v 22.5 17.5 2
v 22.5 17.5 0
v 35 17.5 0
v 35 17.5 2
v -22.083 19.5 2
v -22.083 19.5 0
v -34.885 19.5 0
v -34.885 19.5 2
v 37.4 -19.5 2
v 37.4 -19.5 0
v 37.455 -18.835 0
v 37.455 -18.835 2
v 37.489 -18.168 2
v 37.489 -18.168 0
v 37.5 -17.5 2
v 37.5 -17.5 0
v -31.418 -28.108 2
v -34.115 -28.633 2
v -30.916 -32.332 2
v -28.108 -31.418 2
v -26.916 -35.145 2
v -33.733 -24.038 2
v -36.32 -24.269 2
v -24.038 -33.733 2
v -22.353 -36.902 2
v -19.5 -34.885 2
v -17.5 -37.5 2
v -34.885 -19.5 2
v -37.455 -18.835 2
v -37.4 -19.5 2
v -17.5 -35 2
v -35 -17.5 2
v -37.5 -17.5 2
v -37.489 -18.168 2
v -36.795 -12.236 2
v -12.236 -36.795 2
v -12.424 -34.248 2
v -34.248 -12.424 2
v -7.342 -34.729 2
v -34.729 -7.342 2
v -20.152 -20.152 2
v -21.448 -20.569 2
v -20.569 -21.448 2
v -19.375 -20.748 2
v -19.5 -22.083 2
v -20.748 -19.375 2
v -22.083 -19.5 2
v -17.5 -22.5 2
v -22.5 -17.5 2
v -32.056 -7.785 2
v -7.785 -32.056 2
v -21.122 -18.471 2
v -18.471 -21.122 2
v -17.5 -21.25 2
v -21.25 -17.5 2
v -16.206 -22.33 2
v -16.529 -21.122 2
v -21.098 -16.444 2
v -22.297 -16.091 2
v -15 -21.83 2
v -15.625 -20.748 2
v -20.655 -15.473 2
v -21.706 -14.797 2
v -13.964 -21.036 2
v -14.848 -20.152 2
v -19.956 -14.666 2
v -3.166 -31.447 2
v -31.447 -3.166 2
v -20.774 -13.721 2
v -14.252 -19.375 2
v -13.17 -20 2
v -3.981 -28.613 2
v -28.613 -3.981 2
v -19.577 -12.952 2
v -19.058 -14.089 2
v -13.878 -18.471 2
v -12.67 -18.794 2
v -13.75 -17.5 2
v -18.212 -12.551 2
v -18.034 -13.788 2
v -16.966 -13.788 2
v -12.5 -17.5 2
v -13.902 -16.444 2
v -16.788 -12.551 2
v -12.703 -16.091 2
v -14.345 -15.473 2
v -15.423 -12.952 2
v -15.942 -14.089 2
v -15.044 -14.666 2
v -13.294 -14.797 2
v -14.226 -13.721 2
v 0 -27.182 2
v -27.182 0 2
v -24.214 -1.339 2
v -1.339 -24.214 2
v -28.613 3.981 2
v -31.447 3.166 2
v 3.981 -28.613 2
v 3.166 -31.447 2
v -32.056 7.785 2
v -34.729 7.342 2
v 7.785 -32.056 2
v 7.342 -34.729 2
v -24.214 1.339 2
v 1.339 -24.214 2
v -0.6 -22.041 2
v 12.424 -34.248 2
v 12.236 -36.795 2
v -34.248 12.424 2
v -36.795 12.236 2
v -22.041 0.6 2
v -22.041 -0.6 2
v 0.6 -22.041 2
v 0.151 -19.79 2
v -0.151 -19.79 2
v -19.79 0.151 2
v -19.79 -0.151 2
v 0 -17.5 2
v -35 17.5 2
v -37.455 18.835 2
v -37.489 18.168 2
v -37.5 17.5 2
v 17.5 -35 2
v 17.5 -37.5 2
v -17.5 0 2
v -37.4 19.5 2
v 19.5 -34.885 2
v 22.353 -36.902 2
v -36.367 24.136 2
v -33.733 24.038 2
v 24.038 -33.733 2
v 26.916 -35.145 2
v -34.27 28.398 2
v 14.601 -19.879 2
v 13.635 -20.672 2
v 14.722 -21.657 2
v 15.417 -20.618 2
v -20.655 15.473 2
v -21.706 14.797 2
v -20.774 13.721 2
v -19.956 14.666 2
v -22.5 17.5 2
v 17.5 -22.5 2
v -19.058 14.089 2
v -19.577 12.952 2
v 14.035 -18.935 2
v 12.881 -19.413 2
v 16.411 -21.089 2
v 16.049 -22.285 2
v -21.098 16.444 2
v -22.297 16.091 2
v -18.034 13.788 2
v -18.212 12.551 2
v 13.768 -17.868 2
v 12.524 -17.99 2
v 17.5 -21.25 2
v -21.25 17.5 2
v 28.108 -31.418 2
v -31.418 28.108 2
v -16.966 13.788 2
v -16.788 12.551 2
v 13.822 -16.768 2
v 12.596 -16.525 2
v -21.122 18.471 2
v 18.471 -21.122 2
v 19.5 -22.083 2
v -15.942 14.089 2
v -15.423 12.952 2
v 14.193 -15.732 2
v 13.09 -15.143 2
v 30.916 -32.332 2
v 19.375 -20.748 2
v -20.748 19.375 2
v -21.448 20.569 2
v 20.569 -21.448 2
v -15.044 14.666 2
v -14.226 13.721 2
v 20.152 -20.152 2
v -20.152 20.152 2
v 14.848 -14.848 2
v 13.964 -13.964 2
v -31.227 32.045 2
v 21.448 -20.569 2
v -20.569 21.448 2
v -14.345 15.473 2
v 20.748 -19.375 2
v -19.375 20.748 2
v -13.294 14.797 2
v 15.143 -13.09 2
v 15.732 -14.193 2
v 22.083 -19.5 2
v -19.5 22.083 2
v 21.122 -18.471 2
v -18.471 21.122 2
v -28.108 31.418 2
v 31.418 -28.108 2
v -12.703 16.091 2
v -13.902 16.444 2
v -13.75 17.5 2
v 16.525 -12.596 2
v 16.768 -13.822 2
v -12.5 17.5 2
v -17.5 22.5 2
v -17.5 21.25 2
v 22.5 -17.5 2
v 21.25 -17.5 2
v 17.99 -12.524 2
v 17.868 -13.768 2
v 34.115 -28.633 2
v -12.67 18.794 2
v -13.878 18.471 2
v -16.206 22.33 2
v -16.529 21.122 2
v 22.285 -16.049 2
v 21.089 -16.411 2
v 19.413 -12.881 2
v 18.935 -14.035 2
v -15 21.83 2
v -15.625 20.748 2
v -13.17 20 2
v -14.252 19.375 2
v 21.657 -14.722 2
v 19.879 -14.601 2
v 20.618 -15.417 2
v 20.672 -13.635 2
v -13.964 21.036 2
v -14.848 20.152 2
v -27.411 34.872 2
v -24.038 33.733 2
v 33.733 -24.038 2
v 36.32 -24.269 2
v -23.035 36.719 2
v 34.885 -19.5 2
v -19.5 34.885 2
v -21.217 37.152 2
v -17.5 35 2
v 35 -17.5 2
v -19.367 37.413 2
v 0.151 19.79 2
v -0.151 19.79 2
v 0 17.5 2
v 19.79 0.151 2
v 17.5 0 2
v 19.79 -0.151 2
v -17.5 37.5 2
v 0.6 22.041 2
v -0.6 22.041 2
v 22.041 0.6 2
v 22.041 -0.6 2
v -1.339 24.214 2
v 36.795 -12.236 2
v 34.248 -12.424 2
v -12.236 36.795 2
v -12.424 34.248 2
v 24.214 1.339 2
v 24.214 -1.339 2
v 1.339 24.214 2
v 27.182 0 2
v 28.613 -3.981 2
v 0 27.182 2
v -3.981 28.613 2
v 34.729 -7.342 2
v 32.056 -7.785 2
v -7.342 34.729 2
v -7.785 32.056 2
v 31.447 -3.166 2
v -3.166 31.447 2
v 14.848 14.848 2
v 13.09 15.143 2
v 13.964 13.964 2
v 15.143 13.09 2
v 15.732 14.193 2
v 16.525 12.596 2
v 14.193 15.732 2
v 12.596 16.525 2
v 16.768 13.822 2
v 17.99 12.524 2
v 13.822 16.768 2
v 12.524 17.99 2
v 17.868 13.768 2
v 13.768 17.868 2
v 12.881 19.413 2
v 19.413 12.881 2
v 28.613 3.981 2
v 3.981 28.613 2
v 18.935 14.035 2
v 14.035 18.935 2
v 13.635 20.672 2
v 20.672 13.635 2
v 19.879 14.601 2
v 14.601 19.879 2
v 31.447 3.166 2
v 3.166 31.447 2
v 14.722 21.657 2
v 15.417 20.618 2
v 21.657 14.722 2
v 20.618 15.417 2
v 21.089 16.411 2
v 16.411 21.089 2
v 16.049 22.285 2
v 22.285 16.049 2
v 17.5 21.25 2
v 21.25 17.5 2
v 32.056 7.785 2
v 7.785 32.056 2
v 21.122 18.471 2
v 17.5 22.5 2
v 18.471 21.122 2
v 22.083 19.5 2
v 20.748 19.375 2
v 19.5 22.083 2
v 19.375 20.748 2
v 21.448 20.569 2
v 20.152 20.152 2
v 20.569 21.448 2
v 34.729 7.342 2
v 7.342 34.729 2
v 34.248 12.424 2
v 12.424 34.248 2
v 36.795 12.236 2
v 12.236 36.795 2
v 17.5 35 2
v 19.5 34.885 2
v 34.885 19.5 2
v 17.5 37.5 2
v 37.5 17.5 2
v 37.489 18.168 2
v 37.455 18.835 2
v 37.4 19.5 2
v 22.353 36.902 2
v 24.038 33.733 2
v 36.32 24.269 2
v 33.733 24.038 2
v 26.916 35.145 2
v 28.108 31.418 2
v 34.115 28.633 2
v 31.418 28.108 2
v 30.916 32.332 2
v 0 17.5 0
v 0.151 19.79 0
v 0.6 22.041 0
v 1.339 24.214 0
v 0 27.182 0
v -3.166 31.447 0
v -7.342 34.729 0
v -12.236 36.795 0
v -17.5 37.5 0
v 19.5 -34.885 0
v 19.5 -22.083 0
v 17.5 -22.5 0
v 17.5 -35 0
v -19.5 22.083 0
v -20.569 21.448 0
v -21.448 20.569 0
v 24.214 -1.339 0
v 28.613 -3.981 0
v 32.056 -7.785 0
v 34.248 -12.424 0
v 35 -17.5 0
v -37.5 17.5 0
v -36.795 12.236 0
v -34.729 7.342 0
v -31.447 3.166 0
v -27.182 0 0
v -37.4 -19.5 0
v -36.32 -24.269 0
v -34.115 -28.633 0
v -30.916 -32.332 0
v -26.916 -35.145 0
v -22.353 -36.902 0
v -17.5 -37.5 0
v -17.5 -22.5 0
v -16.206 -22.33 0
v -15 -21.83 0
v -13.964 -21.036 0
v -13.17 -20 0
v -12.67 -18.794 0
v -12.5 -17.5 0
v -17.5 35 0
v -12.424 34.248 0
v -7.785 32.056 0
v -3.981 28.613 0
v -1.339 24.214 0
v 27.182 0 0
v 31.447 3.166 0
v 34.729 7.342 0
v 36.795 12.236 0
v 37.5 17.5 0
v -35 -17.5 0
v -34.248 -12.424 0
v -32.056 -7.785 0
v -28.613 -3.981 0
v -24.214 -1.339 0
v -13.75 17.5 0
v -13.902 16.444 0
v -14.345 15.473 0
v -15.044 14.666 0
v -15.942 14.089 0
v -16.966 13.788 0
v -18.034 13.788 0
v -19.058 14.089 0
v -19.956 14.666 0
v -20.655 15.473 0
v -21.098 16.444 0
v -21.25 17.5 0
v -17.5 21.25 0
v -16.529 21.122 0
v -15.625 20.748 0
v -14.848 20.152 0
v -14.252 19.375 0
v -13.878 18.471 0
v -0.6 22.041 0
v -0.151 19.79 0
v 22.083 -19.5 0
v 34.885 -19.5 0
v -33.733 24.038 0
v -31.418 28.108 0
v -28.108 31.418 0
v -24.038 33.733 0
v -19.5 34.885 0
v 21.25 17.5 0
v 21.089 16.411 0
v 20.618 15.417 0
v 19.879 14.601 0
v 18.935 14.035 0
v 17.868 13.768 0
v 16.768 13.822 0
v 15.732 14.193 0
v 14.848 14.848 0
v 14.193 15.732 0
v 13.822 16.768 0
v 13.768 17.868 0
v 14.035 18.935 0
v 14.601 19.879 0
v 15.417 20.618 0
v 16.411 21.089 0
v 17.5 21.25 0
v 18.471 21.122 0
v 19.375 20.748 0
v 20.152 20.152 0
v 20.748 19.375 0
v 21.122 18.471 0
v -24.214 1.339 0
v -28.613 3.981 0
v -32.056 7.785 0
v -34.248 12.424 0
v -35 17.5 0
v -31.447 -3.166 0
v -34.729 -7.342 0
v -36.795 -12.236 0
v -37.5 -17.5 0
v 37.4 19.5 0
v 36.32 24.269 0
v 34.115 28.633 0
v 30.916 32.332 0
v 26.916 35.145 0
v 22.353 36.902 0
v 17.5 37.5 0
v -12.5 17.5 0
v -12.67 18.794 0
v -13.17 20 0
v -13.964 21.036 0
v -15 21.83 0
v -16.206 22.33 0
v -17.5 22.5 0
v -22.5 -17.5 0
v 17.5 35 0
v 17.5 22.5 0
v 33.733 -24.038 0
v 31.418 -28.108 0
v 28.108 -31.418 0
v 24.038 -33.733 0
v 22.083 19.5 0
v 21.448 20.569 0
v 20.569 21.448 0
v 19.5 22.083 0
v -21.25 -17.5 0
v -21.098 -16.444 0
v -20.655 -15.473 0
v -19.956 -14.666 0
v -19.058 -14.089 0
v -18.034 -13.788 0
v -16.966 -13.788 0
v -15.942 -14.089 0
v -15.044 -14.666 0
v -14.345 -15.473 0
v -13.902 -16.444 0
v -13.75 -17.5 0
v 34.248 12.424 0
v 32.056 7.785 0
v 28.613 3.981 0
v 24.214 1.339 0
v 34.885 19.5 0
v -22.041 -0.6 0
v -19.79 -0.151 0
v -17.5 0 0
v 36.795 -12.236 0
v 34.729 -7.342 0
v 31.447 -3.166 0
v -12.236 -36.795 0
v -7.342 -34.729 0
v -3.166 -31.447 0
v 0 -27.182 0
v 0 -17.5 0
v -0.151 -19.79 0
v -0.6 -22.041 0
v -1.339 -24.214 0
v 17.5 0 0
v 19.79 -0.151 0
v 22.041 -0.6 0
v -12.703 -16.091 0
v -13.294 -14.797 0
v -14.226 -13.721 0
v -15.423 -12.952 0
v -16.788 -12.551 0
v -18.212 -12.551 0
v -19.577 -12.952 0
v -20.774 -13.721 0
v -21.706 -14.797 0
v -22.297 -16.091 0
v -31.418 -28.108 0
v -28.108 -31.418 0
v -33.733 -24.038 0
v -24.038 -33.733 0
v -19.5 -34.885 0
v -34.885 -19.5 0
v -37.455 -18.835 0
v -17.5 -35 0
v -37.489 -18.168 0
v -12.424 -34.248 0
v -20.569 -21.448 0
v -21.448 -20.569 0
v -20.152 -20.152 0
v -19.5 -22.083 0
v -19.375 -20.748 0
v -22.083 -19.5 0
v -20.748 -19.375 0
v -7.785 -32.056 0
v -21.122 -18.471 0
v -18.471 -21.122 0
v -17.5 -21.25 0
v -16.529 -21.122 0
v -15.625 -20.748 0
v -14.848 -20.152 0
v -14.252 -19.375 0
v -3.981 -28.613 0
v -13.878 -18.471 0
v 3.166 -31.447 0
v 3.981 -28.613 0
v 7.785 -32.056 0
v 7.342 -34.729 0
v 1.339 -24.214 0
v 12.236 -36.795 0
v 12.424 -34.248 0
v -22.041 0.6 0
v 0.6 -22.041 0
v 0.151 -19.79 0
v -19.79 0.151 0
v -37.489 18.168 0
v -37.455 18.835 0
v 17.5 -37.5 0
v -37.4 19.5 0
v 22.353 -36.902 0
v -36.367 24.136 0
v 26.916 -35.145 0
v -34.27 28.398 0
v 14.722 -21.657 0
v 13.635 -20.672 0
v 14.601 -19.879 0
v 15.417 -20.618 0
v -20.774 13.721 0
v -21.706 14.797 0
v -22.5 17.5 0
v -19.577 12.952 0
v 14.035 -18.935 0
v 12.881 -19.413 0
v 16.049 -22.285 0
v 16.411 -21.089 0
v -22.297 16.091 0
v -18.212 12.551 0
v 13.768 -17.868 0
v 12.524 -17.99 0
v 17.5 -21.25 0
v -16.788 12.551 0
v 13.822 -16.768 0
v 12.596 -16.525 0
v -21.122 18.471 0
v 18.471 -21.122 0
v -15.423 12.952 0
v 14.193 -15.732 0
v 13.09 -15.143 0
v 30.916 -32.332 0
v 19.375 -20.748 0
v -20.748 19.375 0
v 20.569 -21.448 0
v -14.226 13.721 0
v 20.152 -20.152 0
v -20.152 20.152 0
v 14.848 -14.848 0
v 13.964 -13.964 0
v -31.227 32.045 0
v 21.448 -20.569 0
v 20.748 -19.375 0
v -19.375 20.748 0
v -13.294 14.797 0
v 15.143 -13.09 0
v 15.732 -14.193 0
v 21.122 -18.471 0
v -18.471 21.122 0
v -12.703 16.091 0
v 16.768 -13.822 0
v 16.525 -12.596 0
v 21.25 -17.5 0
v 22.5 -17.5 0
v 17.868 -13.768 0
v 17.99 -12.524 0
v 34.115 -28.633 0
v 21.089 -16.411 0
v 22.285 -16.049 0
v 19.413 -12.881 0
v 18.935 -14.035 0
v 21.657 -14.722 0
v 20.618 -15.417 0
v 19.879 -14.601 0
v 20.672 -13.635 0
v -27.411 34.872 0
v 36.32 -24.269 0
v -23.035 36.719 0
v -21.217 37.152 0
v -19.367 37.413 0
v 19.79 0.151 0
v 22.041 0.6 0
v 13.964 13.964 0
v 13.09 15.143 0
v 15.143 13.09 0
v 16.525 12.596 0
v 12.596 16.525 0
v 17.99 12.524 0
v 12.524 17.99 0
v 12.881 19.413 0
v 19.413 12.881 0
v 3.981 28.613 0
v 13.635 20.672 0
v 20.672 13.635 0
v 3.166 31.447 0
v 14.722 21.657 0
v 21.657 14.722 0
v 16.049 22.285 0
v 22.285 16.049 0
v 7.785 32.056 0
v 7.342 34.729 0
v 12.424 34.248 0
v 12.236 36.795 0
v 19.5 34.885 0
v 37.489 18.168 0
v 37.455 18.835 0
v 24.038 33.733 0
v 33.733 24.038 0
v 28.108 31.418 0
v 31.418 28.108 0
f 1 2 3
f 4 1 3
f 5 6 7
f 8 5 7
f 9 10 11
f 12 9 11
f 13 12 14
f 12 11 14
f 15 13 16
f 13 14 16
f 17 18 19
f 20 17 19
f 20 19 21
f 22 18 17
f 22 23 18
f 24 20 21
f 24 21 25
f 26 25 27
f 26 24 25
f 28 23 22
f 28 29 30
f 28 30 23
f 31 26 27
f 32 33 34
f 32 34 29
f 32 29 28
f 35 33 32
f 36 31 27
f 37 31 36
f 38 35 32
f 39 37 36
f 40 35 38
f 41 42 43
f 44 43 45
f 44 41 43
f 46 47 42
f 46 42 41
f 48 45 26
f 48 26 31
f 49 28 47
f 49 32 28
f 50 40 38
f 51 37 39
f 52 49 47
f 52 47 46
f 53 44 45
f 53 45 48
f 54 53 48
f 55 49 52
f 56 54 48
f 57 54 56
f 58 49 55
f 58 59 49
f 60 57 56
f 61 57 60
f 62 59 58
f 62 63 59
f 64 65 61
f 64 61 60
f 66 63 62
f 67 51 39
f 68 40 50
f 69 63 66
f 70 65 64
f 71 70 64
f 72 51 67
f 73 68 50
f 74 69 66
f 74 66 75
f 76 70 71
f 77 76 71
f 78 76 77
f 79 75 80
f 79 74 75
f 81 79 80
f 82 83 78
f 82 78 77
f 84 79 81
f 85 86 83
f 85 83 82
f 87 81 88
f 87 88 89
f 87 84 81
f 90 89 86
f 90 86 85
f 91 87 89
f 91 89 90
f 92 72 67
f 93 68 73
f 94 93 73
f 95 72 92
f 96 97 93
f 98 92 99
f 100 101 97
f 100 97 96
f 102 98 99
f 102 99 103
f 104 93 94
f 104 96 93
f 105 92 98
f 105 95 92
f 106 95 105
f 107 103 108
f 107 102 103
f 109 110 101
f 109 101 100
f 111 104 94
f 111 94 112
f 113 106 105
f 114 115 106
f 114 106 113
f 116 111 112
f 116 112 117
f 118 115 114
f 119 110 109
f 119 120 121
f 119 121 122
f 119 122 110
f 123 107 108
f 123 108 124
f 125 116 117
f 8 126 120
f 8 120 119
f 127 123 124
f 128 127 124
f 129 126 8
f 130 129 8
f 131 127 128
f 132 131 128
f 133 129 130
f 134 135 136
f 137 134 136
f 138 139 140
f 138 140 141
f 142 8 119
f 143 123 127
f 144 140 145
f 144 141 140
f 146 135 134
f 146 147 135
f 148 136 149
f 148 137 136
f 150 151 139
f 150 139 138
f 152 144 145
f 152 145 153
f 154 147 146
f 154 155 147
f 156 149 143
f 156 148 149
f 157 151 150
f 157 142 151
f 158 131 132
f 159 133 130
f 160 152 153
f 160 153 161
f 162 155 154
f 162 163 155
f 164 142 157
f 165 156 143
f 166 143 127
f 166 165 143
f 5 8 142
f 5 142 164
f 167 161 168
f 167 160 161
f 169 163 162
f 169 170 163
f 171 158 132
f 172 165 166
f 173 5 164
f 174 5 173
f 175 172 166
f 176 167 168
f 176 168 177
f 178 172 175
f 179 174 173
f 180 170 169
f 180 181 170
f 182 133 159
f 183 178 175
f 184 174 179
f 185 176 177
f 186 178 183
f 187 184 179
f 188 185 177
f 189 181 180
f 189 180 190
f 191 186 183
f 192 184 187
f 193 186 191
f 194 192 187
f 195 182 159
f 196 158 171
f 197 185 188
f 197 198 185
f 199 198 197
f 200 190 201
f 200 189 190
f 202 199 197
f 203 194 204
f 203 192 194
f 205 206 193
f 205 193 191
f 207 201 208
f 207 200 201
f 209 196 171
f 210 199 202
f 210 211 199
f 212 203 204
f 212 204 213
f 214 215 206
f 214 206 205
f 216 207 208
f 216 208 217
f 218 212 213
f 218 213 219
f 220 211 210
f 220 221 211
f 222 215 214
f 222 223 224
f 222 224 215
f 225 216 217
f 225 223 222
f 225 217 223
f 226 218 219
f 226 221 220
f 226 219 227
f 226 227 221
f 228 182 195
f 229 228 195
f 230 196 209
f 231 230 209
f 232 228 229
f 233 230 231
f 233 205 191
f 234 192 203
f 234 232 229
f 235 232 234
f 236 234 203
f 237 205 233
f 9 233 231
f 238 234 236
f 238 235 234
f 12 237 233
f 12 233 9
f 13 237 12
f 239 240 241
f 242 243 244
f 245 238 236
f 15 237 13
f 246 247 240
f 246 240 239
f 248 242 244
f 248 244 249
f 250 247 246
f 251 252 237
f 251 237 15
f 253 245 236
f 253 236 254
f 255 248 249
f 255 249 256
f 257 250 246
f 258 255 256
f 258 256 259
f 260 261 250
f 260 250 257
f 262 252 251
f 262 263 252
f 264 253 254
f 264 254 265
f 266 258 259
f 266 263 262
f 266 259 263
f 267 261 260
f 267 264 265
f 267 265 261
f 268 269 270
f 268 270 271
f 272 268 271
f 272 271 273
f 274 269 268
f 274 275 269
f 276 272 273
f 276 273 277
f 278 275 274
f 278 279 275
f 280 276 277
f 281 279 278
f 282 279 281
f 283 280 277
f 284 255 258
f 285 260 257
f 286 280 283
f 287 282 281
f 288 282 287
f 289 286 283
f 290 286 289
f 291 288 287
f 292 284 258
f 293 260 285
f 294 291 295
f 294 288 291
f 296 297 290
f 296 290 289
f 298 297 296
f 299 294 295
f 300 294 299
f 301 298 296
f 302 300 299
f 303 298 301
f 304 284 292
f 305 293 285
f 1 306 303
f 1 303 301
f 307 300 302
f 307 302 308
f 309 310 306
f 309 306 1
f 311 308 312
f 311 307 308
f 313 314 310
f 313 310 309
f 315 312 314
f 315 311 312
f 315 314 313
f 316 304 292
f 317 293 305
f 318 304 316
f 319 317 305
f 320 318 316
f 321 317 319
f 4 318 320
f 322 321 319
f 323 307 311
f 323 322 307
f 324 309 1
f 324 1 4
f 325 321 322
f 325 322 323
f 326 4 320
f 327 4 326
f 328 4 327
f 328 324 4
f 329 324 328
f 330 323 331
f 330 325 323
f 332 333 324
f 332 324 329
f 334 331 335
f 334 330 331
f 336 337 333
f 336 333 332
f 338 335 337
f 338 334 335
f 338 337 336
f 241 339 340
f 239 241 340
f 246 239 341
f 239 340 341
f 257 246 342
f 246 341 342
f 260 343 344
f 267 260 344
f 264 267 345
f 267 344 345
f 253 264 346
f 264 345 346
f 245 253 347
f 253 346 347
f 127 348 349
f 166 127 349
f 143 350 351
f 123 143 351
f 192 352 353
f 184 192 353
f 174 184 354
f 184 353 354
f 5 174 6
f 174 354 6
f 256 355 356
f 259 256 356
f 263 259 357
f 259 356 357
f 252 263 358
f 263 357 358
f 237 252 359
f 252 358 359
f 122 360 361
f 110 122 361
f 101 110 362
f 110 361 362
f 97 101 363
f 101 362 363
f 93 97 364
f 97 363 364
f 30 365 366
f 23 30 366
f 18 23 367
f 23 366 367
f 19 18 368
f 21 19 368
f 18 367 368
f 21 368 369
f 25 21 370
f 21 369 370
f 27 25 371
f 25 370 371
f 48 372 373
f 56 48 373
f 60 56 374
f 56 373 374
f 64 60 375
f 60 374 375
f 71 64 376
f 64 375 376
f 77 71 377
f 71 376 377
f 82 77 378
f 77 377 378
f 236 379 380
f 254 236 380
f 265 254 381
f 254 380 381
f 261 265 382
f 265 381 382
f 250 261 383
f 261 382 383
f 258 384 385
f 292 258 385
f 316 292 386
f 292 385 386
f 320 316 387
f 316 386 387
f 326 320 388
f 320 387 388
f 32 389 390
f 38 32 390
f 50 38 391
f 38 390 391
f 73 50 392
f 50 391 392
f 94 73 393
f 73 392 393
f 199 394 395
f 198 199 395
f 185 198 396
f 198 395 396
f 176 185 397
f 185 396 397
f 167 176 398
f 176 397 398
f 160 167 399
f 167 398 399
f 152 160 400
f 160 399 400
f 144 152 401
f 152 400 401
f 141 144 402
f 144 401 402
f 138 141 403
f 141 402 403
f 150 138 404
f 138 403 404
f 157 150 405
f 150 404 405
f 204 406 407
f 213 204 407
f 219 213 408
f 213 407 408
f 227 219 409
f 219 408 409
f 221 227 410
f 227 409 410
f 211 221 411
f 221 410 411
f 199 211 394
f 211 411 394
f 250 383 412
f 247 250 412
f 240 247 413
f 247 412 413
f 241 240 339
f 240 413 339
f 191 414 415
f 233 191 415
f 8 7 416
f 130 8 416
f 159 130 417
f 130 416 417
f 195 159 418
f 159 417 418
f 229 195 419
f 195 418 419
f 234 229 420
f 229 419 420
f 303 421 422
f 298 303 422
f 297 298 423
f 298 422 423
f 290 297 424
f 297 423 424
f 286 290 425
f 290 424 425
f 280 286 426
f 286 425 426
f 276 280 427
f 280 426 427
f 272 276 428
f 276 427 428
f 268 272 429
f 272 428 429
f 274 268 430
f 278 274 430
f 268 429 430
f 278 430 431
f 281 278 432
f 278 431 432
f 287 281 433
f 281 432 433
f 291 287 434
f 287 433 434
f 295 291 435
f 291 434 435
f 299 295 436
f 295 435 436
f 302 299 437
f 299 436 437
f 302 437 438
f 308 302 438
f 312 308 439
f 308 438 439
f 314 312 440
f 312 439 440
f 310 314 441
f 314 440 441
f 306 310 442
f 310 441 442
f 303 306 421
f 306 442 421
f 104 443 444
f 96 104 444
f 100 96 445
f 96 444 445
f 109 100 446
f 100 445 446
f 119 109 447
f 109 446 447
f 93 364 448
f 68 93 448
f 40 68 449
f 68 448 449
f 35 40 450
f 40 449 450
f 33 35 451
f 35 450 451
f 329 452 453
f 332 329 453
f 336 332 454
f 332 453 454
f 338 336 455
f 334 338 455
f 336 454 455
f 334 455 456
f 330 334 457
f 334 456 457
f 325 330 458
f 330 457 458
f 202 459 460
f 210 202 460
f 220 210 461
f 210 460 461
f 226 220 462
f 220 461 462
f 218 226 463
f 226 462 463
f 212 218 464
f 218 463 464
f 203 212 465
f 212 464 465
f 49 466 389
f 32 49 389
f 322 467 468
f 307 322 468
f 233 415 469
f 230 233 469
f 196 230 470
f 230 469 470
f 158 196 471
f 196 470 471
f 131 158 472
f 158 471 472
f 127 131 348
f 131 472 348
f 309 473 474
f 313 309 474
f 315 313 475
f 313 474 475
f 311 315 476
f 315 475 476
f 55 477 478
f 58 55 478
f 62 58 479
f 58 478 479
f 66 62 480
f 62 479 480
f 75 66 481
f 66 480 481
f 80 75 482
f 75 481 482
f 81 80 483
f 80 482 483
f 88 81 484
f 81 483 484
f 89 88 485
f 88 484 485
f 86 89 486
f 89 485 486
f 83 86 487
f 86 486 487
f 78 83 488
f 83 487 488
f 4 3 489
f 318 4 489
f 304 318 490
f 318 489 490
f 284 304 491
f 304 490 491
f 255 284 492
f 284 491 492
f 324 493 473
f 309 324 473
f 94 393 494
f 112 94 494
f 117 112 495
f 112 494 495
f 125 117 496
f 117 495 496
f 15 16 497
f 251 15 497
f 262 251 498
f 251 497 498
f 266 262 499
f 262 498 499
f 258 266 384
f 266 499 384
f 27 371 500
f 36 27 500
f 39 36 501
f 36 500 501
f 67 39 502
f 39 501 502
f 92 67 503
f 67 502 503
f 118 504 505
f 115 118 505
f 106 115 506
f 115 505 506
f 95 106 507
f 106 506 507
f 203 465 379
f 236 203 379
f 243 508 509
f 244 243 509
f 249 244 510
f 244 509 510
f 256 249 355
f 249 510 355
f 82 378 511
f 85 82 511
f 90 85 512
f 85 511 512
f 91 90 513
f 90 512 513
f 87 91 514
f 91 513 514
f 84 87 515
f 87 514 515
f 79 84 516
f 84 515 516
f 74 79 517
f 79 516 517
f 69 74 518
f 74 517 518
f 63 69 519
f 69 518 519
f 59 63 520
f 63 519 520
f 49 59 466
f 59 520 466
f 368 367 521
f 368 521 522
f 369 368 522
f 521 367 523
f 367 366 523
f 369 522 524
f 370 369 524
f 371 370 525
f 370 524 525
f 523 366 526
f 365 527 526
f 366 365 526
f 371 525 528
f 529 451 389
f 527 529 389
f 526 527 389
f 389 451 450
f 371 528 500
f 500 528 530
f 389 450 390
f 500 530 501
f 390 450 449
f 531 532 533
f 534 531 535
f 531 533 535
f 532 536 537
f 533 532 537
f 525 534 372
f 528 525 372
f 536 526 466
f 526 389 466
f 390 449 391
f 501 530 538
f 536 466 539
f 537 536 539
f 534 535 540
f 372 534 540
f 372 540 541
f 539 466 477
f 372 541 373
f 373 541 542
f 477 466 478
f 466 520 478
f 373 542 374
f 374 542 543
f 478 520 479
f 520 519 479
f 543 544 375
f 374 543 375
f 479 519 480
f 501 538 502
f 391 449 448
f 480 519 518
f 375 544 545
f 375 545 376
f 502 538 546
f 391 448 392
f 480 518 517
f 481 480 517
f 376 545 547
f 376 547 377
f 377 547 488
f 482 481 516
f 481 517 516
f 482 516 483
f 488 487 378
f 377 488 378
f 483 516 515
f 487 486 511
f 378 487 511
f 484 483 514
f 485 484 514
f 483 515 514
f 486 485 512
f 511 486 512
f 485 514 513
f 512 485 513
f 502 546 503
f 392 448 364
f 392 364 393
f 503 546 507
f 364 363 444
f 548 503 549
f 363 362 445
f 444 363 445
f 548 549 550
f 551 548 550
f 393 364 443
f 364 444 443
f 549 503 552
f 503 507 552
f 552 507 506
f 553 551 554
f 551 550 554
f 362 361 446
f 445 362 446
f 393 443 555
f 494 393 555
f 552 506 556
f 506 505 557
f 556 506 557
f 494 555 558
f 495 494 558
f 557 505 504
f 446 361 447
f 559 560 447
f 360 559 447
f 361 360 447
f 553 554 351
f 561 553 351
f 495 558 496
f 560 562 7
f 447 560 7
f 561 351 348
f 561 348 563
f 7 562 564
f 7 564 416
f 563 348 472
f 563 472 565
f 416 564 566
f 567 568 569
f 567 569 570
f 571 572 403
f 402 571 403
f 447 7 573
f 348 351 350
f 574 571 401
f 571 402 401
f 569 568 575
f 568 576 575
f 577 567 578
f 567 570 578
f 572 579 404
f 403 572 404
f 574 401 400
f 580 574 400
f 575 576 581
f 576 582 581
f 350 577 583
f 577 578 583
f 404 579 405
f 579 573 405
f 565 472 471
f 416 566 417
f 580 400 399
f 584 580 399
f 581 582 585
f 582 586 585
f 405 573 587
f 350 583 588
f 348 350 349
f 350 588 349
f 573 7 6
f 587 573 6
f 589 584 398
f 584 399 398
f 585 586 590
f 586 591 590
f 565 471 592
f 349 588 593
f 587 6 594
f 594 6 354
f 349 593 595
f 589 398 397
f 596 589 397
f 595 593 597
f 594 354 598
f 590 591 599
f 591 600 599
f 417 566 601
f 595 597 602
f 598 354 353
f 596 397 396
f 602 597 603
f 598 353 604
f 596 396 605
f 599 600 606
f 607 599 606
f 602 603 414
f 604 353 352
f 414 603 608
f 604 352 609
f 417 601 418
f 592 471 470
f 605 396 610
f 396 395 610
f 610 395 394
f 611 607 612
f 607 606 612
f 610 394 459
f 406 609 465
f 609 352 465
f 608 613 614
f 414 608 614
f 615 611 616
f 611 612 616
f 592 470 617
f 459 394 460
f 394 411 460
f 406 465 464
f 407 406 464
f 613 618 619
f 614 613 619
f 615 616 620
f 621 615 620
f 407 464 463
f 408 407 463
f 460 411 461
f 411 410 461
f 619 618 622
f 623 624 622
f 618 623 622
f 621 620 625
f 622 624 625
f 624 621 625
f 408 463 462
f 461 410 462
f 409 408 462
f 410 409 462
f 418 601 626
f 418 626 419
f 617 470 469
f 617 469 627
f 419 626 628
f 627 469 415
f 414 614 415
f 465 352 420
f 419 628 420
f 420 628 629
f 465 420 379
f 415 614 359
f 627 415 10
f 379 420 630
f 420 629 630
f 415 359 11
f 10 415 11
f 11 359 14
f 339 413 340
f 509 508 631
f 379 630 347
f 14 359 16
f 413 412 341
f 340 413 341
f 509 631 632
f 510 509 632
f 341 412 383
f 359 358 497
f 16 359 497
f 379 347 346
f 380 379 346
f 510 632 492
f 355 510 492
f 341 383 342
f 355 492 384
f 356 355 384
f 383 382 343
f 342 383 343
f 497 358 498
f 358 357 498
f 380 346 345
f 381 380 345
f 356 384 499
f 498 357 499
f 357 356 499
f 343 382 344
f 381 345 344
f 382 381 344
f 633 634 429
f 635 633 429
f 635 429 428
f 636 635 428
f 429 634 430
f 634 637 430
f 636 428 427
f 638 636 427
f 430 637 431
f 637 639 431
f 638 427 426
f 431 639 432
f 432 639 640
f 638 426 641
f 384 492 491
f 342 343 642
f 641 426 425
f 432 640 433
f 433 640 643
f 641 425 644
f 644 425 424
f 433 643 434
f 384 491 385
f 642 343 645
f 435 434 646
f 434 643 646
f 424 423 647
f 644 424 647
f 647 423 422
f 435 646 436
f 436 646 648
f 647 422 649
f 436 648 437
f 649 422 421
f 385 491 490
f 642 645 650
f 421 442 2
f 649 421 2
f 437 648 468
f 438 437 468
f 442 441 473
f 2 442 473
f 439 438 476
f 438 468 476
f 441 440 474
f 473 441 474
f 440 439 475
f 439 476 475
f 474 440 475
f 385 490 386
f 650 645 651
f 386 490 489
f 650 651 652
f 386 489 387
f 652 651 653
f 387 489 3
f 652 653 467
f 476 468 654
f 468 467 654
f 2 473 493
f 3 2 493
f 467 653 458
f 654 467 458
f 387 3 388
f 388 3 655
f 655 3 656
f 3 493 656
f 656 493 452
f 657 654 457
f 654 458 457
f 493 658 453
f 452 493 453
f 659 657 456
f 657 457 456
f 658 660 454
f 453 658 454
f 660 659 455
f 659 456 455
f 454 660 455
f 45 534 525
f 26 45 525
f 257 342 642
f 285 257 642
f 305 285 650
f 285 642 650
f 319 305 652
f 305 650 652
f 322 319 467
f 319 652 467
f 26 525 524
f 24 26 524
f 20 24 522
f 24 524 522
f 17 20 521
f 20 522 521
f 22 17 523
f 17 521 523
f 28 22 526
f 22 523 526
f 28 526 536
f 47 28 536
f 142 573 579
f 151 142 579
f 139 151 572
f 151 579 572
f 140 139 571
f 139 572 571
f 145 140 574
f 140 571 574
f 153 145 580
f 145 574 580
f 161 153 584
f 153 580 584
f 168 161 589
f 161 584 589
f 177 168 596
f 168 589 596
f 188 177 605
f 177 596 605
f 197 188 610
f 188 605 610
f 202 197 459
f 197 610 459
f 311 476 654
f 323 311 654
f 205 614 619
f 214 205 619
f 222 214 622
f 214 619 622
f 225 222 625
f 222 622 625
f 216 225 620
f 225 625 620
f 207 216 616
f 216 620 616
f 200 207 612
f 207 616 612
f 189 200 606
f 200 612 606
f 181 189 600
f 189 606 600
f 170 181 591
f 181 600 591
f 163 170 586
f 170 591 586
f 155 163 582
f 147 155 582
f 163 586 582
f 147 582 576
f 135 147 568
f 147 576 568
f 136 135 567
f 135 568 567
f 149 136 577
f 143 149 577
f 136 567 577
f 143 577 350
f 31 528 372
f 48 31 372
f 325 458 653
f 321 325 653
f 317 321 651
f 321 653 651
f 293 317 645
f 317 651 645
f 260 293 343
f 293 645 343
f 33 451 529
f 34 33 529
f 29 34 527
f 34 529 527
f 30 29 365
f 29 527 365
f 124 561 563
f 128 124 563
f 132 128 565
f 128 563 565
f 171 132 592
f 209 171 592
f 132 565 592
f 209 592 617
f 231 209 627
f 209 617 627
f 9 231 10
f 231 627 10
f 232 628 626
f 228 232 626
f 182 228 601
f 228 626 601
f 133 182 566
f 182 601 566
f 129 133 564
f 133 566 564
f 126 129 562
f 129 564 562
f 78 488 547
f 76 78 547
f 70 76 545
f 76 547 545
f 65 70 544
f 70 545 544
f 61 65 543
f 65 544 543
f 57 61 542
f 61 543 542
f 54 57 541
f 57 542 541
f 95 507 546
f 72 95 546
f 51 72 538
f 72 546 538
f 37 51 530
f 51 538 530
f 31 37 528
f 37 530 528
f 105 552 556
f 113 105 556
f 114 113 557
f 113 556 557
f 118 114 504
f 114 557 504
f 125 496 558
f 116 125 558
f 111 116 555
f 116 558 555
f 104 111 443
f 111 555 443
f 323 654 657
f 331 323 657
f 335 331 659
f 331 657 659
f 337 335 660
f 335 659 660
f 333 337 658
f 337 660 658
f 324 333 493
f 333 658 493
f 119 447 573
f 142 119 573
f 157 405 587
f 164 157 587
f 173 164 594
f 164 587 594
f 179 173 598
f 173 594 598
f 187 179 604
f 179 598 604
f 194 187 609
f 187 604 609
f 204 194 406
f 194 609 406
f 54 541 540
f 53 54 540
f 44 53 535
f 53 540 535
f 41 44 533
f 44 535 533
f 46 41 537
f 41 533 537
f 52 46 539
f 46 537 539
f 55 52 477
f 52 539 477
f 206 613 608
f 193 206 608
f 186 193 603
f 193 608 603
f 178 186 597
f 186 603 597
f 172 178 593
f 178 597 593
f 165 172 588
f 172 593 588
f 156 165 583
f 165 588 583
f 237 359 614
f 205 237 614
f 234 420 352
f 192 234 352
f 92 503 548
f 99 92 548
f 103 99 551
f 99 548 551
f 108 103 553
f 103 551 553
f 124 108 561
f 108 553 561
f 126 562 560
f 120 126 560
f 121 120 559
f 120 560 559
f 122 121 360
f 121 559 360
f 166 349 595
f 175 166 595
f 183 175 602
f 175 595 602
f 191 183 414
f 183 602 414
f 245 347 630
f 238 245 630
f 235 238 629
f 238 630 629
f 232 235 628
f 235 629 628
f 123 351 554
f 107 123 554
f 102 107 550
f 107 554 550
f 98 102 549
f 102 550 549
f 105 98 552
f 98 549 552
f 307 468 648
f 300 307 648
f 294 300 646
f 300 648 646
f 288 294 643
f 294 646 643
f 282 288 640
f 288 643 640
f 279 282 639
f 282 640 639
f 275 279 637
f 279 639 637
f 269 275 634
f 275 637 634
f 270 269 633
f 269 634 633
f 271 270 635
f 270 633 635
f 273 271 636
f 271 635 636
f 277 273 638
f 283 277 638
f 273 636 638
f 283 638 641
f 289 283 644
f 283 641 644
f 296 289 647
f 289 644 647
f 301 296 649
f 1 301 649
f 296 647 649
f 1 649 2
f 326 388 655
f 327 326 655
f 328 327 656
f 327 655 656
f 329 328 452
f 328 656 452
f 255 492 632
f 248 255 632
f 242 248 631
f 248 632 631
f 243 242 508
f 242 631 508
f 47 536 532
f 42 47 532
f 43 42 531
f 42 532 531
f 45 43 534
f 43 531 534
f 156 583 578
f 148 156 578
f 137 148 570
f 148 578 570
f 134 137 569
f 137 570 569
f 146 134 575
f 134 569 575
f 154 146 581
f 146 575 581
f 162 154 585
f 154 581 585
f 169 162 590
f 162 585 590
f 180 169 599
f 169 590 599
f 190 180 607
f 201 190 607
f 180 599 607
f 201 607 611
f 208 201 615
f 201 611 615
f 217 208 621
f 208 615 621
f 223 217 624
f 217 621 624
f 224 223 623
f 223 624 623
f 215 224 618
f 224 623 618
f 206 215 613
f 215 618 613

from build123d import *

# Parameters (mm, degrees)
F1_DEPTH = 2


with BuildPart() as f1:
    # F0 (on Top) → F1 (new body)
    with BuildSketch(Plane.XY):
        with BuildLine():
            ThreePointArc((-17.5, 35), (-7.785309692, 32.0559194907), (-1.3392857143, 24.214261968))
            ThreePointArc((-1.3392857143, 24.214261968), (-0.7301527426, 25.7256629508), (0, 27.1824583655))
            ThreePointArc((0, 27.1824583655), (-7.3424699683, 34.7285978436), (-17.5, 37.5))
            Line((-17.5, 37.5), (-17.5, 35))
        make_face()
        with BuildLine():
            ThreePointArc((-35, -17.5), (-32.0559194907, -7.785309692), (-24.214261968, -1.3392857143))
            ThreePointArc((-24.214261968, -1.3392857143), (-25.7256629508, -0.7301527426), (-27.1824583655, 0))
            ThreePointArc((-27.1824583655, 0), (-34.7285978436, -7.3424699683), (-37.5, -17.5))
            Line((-37.5, -17.5), (-35, -17.5))
        make_face()
        with BuildLine():
            ThreePointArc((27.1824583655, 0), (25.7256629508, -0.7301527426), (24.214261968, -1.3392857143))
            ThreePointArc((24.214261968, -1.3392857143), (32.0559194907, -7.785309692), (35, -17.5))
            Line((35, -17.5), (37.5, -17.5))
            ThreePointArc((37.5, -17.5), (34.7285978436, -7.3424699683), (27.1824583655, 0))
        make_face()
        with BuildLine():
            ThreePointArc((0, 27.1824583655), (0.7301527426, 25.7256629508), (1.3392857143, 24.214261968))
            ThreePointArc((1.3392857143, 24.214261968), (7.785309692, 32.0559194907), (17.5, 35))
            Line((17.5, 35), (17.5, 37.5))
            ThreePointArc((17.5, 37.5), (7.3424699683, 34.7285978436), (0, 27.1824583655))
        make_face()
        with BuildLine():
            ThreePointArc((24.214261968, 1.3392857143), (20.9232660165, 0.3380872342), (17.5000000654, 0))
            ThreePointArc((17.5000000654, 0), (20.9232660165, -0.3380872342), (24.214261968, -1.3392857143))
            ThreePointArc((24.214261968, -1.3392857143), (25.7256629508, -0.7301527426), (27.1824583655, 0))
            ThreePointArc((27.1824583655, 0), (25.7256629508, 0.7301527426), (24.214261968, 1.3392857143))
        make_face()
        with BuildLine():
            ThreePointArc((1.3392857143, -24.214261968), (0.3380872278, -20.9232659844), (0, -17.5))
            ThreePointArc((0, -17.5), (-0.3380872278, -20.9232659844), (-1.3392857143, -24.214261968))
            ThreePointArc((-1.3392857143, -24.214261968), (-0.7301527426, -25.7256629508), (0, -27.1824583655))
            ThreePointArc((0, -27.1824583655), (0.7301527426, -25.7256629508), (1.3392857143, -24.214261968))
        make_face()
        with BuildLine():
            ThreePointArc((-24.214261968, -1.3392857143), (-20.9232659844, -0.3380872278), (-17.5, 0))
            ThreePointArc((-17.5, 0), (-20.9232659844, 0.3380872278), (-24.214261968, 1.3392857143))
            ThreePointArc((-24.214261968, 1.3392857143), (-25.7256629508, 0.7301527426), (-27.1824583655, 0))
            ThreePointArc((-27.1824583655, 0), (-25.7256629508, -0.7301527426), (-24.214261968, -1.3392857143))
        make_face()
        with BuildLine():
            ThreePointArc((-1.3392857143, 24.214261968), (-0.3380872278, 20.9232659844), (0, 17.5))
            ThreePointArc((0, 17.5), (0.3380872278, 20.9232659844), (1.3392857143, 24.214261968))
            ThreePointArc((1.3392857143, 24.214261968), (0.7301527426, 25.7256629508), (0, 27.1824583655))
            ThreePointArc((0, 27.1824583655), (-0.7301527426, 25.7256629508), (-1.3392857143, 24.214261968))
        make_face()
        with BuildLine():
            ThreePointArc((-27.1824583655, 0), (-25.7256629508, 0.7301527426), (-24.214261968, 1.3392857143))
            ThreePointArc((-24.214261968, 1.3392857143), (-32.0559194907, 7.785309692), (-35, 17.5))
            Line((-35, 17.5), (-37.5, 17.5))
            ThreePointArc((-37.5, 17.5), (-34.7285978436, 7.3424699683), (-27.1824583655, 0))
        make_face()
        with BuildLine():
            ThreePointArc((-34.8853386507, 19.5), (-29.8743686708, 29.8743686708), (-19.5, 34.8853386507))
            Line((-19.5, 34.8853386507), (-19.5, 36.718895694))
            Line((-19.5, 36.718895694), (-23.0348033662, 36.718895694))
            ThreePointArc((-23.0348033662, 36.718895694), (-32.8574640637, 30.3120372124), (-37.3997487421, 19.5))
            Line((-37.3997487421, 19.5), (-34.8853386507, 19.5))
        make_face()
        with BuildLine():
            ThreePointArc((-35, 17.5), (-34.971311147, 18.501642055), (-34.8853386507, 19.5))
            Line((-34.8853386507, 19.5), (-37.3997487421, 19.5))
            ThreePointArc((-37.3997487421, 19.5), (-37.4749214622, 18.5012555012), (-37.5, 17.5))
            Line((-37.5, 17.5), (-35, 17.5))
        make_face()
        with BuildLine():
            Line((-22.082575695, 19.5), (-34.8853386507, 19.5))
            ThreePointArc((-34.8853386507, 19.5), (-34.971311147, 18.501642055), (-35, 17.5))
            Line((-35, 17.5), (-22.5, 17.5))
            ThreePointArc((-22.5, 17.5), (-22.3945315647, 18.5215482184), (-22.082575695, 19.5))
        make_face()
        with BuildLine():
            Line((-17.5, 21.25), (-17.5, 22.5))
            ThreePointArc((-17.5, 22.5), (-18.5215482184, 22.3945315647), (-19.5, 22.082575695))
            ThreePointArc((-19.5, 22.082575695), (-21.0355339059, 21.0355339059), (-22.082575695, 19.5))
            ThreePointArc((-22.082575695, 19.5), (-22.3945315647, 18.5215482184), (-22.5, 17.5))
            Line((-22.5, 17.5), (-21.25, 17.5))
            ThreePointArc((-21.25, 17.5), (-20.1516504294, 20.1516504294), (-17.5, 21.25))
        make_face()
        with BuildLine():
            Line((-17.5, 22.5), (-17.5, 35))
            ThreePointArc((-17.5, 35), (-18.501642055, 34.971311147), (-19.5, 34.8853386507))
            Line((-19.5, 34.8853386507), (-19.5, 22.082575695))
            ThreePointArc((-19.5, 22.082575695), (-18.5215482184, 22.3945315647), (-17.5, 22.5))
        make_face()
        with BuildLine():
            ThreePointArc((-12.5, 17.5), (-13.9644660941, 21.0355339059), (-17.5, 22.5))
            Line((-17.5, 22.5), (-17.5, 21.25))
            ThreePointArc((-17.5, 21.25), (-14.8483495706, 20.1516504294), (-13.75, 17.5))
            ThreePointArc((-13.75, 17.5), (-17.5, 13.75), (-21.25, 17.5))
            Line((-21.25, 17.5), (-22.5, 17.5))
            ThreePointArc((-22.5, 17.5), (-17.5, 12.5), (-12.5, 17.5))
        make_face()
        with BuildLine():
            ThreePointArc((-19.5, 34.8853386507), (-18.501642055, 34.971311147), (-17.5, 35))
            Line((-17.5, 35), (-17.5, 37.5))
            ThreePointArc((-17.5, 37.5), (-20.2948243343, 37.3037611817), (-23.0348033662, 36.718895694))
            Line((-23.0348033662, 36.718895694), (-19.5, 36.718895694))
            Line((-19.5, 36.718895694), (-19.5, 34.8853386507))
        make_face()
        with BuildLine():
            ThreePointArc((-34.8853386507, -19.5), (-34.971311147, -18.501642055), (-35, -17.5))
            Line((-35, -17.5), (-37.5, -17.5))
            ThreePointArc((-37.5, -17.5), (-37.4749214622, -18.5012555012), (-37.3997487421, -19.5))
            Line((-37.3997487421, -19.5), (-34.8853386507, -19.5))
        make_face()
        with BuildLine():
            Line((-22.5, -17.5), (-35, -17.5))
            ThreePointArc((-35, -17.5), (-34.971311147, -18.501642055), (-34.8853386507, -19.5))
            Line((-34.8853386507, -19.5), (-22.082575695, -19.5))
            ThreePointArc((-22.082575695, -19.5), (-22.3945315647, -18.5215482184), (-22.5, -17.5))
        make_face()
        with BuildLine():
            ThreePointArc((-19.5, -34.8853386507), (-29.8743686708, -29.8743686708), (-34.8853386507, -19.5))
            Line((-34.8853386507, -19.5), (-37.3997487421, -19.5))
            ThreePointArc((-37.3997487421, -19.5), (-30.916407865, -32.3323969742), (-17.5, -37.5))
            Line((-17.5, -37.5), (-17.5, -35))
            ThreePointArc((-17.5, -35), (-18.501642055, -34.971311147), (-19.5, -34.8853386507))
        make_face()
        with BuildLine():
            Line((-21.25, -17.5), (-22.5, -17.5))
            ThreePointArc((-22.5, -17.5), (-22.3945315647, -18.5215482184), (-22.082575695, -19.5))
            ThreePointArc((-22.082575695, -19.5), (-21.0355339059, -21.0355339059), (-19.5, -22.082575695))
            ThreePointArc((-19.5, -22.082575695), (-18.5215482184, -22.3945315647), (-17.5, -22.5))
            Line((-17.5, -22.5), (-17.5, -21.25))
            ThreePointArc((-17.5, -21.25), (-20.1516504294, -20.1516504294), (-21.25, -17.5))
        make_face()
        with BuildLine():
            ThreePointArc((-19.5, -34.8853386507), (-18.501642055, -34.971311147), (-17.5, -35))
            Line((-17.5, -35), (-17.5, -22.5))
            ThreePointArc((-17.5, -22.5), (-18.5215482184, -22.3945315647), (-19.5, -22.082575695))
            Line((-19.5, -22.082575695), (-19.5, -34.8853386507))
        make_face()
        with BuildLine():
            ThreePointArc((-12.5, -17.5), (-17.5, -12.5), (-22.5, -17.5))
            Line((-22.5, -17.5), (-21.25, -17.5))
            ThreePointArc((-21.25, -17.5), (-17.5, -13.75), (-13.75, -17.5))
            ThreePointArc((-13.75, -17.5), (-14.8483495706, -20.1516504294), (-17.5, -21.25))
            Line((-17.5, -21.25), (-17.5, -22.5))
            ThreePointArc((-17.5, -22.5), (-13.9644660941, -21.0355339059), (-12.5, -17.5))
        make_face()
        with BuildLine():
            ThreePointArc((0, -27.1824583655), (-0.7301527426, -25.7256629508), (-1.3392857143, -24.214261968))
            ThreePointArc((-1.3392857143, -24.214261968), (-7.785309692, -32.0559194907), (-17.5, -35))
            Line((-17.5, -35), (-17.5, -37.5))
            ThreePointArc((-17.5, -37.5), (-7.3424699683, -34.7285978436), (0, -27.1824583655))
        make_face()
        with BuildLine():
            ThreePointArc((17.5, -35), (7.785309692, -32.0559194907), (1.3392857143, -24.214261968))
            ThreePointArc((1.3392857143, -24.214261968), (0.7301527426, -25.7256629508), (0, -27.1824583655))
            ThreePointArc((0, -27.1824583655), (7.3424699683, -34.7285978436), (17.5, -37.5))
            Line((17.5, -37.5), (17.5, -35))
        make_face()
        with BuildLine():
            Line((37.3997487421, -19.5), (34.8853386507, -19.5))
            ThreePointArc((34.8853386507, -19.5), (29.8743686708, -29.8743686708), (19.5, -34.8853386507))
            ThreePointArc((19.5, -34.8853386507), (18.501642055, -34.971311147), (17.5, -35))
            Line((17.5, -35), (17.5, -37.5))
            ThreePointArc((17.5, -37.5), (30.916407865, -32.3323969742), (37.3997487421, -19.5))
        make_face()
        with BuildLine():
            Line((37.5, -17.5), (35, -17.5))
            ThreePointArc((35, -17.5), (34.971311147, -18.501642055), (34.8853386507, -19.5))
            Line((34.8853386507, -19.5), (37.3997487421, -19.5))
            ThreePointArc((37.3997487421, -19.5), (37.4749214622, -18.5012555012), (37.5, -17.5))
        make_face()
        with BuildLine():
            ThreePointArc((34.8853386507, -19.5), (34.971311147, -18.501642055), (35, -17.5))
            Line((35, -17.5), (22.5, -17.5))
            ThreePointArc((22.5, -17.5), (22.3945315647, -18.5215482184), (22.082575695, -19.5))
            Line((22.082575695, -19.5), (34.8853386507, -19.5))
        make_face()
        with BuildLine():
            ThreePointArc((17.5, -35), (18.501642055, -34.971311147), (19.5, -34.8853386507))
            Line((19.5, -34.8853386507), (19.5, -22.082575695))
            ThreePointArc((19.5, -22.082575695), (18.5215482184, -22.3945315647), (17.5, -22.5))
            Line((17.5, -22.5), (17.5, -35))
        make_face()
        with BuildLine():
            ThreePointArc((22.082575695, -19.5), (22.3945315647, -18.5215482184), (22.5, -17.5))
            Line((22.5, -17.5), (21.25, -17.5))
            ThreePointArc((21.25, -17.5), (20.1516504294, -20.1516504294), (17.5, -21.25))
            Line((17.5, -21.25), (17.5, -22.5))
            ThreePointArc((17.5, -22.5), (18.5215482184, -22.3945315647), (19.5, -22.082575695))
            ThreePointArc((19.5, -22.082575695), (21.0355339059, -21.0355339059), (22.082575695, -19.5))
        make_face()
        with BuildLine():
            Line((21.25, -17.5), (22.5, -17.5))
            ThreePointArc((22.5, -17.5), (13.9644660941, -13.9644660941), (17.5, -22.5))
            Line((17.5, -22.5), (17.5, -21.25))
            ThreePointArc((17.5, -21.25), (14.8483495706, -14.8483495706), (21.25, -17.5))
        make_face()
        with BuildLine():
            ThreePointArc((19.5, 34.8853386507), (18.501642055, 34.971311147), (17.5, 35))
            Line((17.5, 35), (17.5, 22.5))
            ThreePointArc((17.5, 22.5), (18.5215482184, 22.3945315647), (19.5, 22.082575695))
            Line((19.5, 22.082575695), (19.5, 34.8853386507))
        make_face()
        with BuildLine():
            ThreePointArc((19.5, 22.082575695), (18.5215482184, 22.3945315647), (17.5, 22.5))
            Line((17.5, 22.5), (17.5, 21.25))
            ThreePointArc((17.5, 21.25), (20.1516504294, 20.1516504294), (21.25, 17.5))
            Line((21.25, 17.5), (22.5, 17.5))
            ThreePointArc((22.5, 17.5), (22.3945315647, 18.5215482184), (22.082575695, 19.5))
            ThreePointArc((22.082575695, 19.5), (21.0355339059, 21.0355339059), (19.5, 22.082575695))
        make_face()
        with BuildLine():
            ThreePointArc((35, 17.5), (34.971311147, 18.501642055), (34.8853386507, 19.5))
            Line((34.8853386507, 19.5), (22.082575695, 19.5))
            ThreePointArc((22.082575695, 19.5), (22.3945315647, 18.5215482184), (22.5, 17.5))
            Line((22.5, 17.5), (35, 17.5))
        make_face()
        with BuildLine():
            Line((17.5, 37.5), (17.5, 35))
            ThreePointArc((17.5, 35), (18.501642055, 34.971311147), (19.5, 34.8853386507))
            ThreePointArc((19.5, 34.8853386507), (29.8743686708, 29.8743686708), (34.8853386507, 19.5))
            Line((34.8853386507, 19.5), (37.3997487421, 19.5))
            ThreePointArc((37.3997487421, 19.5), (30.916407865, 32.3323969742), (17.5, 37.5))
        make_face()
        with BuildLine():
            ThreePointArc((37.5, 17.5), (37.4749214622, 18.5012555012), (37.3997487421, 19.5))
            Line((37.3997487421, 19.5), (34.8853386507, 19.5))
            ThreePointArc((34.8853386507, 19.5), (34.971311147, 18.501642055), (35, 17.5))
            Line((35, 17.5), (37.5, 17.5))
        make_face()
        with BuildLine():
            ThreePointArc((35, 17.5), (32.0559194907, 7.785309692), (24.214261968, 1.3392857143))
            ThreePointArc((24.214261968, 1.3392857143), (25.7256629508, 0.7301527426), (27.1824583655, 0))
            ThreePointArc((27.1824583655, 0), (34.7285978436, 7.3424699683), (37.5, 17.5))
            Line((37.5, 17.5), (35, 17.5))
        make_face()
        with BuildLine():
            Line((17.5, 21.25), (17.5, 22.5))
            ThreePointArc((17.5, 22.5), (13.9644660941, 13.9644660941), (22.5, 17.5))
            Line((22.5, 17.5), (21.25, 17.5))
            ThreePointArc((21.25, 17.5), (14.8483495706, 14.8483495706), (17.5, 21.25))
        make_face()
    extrude(amount=F1_DEPTH)


solid = f1.part
